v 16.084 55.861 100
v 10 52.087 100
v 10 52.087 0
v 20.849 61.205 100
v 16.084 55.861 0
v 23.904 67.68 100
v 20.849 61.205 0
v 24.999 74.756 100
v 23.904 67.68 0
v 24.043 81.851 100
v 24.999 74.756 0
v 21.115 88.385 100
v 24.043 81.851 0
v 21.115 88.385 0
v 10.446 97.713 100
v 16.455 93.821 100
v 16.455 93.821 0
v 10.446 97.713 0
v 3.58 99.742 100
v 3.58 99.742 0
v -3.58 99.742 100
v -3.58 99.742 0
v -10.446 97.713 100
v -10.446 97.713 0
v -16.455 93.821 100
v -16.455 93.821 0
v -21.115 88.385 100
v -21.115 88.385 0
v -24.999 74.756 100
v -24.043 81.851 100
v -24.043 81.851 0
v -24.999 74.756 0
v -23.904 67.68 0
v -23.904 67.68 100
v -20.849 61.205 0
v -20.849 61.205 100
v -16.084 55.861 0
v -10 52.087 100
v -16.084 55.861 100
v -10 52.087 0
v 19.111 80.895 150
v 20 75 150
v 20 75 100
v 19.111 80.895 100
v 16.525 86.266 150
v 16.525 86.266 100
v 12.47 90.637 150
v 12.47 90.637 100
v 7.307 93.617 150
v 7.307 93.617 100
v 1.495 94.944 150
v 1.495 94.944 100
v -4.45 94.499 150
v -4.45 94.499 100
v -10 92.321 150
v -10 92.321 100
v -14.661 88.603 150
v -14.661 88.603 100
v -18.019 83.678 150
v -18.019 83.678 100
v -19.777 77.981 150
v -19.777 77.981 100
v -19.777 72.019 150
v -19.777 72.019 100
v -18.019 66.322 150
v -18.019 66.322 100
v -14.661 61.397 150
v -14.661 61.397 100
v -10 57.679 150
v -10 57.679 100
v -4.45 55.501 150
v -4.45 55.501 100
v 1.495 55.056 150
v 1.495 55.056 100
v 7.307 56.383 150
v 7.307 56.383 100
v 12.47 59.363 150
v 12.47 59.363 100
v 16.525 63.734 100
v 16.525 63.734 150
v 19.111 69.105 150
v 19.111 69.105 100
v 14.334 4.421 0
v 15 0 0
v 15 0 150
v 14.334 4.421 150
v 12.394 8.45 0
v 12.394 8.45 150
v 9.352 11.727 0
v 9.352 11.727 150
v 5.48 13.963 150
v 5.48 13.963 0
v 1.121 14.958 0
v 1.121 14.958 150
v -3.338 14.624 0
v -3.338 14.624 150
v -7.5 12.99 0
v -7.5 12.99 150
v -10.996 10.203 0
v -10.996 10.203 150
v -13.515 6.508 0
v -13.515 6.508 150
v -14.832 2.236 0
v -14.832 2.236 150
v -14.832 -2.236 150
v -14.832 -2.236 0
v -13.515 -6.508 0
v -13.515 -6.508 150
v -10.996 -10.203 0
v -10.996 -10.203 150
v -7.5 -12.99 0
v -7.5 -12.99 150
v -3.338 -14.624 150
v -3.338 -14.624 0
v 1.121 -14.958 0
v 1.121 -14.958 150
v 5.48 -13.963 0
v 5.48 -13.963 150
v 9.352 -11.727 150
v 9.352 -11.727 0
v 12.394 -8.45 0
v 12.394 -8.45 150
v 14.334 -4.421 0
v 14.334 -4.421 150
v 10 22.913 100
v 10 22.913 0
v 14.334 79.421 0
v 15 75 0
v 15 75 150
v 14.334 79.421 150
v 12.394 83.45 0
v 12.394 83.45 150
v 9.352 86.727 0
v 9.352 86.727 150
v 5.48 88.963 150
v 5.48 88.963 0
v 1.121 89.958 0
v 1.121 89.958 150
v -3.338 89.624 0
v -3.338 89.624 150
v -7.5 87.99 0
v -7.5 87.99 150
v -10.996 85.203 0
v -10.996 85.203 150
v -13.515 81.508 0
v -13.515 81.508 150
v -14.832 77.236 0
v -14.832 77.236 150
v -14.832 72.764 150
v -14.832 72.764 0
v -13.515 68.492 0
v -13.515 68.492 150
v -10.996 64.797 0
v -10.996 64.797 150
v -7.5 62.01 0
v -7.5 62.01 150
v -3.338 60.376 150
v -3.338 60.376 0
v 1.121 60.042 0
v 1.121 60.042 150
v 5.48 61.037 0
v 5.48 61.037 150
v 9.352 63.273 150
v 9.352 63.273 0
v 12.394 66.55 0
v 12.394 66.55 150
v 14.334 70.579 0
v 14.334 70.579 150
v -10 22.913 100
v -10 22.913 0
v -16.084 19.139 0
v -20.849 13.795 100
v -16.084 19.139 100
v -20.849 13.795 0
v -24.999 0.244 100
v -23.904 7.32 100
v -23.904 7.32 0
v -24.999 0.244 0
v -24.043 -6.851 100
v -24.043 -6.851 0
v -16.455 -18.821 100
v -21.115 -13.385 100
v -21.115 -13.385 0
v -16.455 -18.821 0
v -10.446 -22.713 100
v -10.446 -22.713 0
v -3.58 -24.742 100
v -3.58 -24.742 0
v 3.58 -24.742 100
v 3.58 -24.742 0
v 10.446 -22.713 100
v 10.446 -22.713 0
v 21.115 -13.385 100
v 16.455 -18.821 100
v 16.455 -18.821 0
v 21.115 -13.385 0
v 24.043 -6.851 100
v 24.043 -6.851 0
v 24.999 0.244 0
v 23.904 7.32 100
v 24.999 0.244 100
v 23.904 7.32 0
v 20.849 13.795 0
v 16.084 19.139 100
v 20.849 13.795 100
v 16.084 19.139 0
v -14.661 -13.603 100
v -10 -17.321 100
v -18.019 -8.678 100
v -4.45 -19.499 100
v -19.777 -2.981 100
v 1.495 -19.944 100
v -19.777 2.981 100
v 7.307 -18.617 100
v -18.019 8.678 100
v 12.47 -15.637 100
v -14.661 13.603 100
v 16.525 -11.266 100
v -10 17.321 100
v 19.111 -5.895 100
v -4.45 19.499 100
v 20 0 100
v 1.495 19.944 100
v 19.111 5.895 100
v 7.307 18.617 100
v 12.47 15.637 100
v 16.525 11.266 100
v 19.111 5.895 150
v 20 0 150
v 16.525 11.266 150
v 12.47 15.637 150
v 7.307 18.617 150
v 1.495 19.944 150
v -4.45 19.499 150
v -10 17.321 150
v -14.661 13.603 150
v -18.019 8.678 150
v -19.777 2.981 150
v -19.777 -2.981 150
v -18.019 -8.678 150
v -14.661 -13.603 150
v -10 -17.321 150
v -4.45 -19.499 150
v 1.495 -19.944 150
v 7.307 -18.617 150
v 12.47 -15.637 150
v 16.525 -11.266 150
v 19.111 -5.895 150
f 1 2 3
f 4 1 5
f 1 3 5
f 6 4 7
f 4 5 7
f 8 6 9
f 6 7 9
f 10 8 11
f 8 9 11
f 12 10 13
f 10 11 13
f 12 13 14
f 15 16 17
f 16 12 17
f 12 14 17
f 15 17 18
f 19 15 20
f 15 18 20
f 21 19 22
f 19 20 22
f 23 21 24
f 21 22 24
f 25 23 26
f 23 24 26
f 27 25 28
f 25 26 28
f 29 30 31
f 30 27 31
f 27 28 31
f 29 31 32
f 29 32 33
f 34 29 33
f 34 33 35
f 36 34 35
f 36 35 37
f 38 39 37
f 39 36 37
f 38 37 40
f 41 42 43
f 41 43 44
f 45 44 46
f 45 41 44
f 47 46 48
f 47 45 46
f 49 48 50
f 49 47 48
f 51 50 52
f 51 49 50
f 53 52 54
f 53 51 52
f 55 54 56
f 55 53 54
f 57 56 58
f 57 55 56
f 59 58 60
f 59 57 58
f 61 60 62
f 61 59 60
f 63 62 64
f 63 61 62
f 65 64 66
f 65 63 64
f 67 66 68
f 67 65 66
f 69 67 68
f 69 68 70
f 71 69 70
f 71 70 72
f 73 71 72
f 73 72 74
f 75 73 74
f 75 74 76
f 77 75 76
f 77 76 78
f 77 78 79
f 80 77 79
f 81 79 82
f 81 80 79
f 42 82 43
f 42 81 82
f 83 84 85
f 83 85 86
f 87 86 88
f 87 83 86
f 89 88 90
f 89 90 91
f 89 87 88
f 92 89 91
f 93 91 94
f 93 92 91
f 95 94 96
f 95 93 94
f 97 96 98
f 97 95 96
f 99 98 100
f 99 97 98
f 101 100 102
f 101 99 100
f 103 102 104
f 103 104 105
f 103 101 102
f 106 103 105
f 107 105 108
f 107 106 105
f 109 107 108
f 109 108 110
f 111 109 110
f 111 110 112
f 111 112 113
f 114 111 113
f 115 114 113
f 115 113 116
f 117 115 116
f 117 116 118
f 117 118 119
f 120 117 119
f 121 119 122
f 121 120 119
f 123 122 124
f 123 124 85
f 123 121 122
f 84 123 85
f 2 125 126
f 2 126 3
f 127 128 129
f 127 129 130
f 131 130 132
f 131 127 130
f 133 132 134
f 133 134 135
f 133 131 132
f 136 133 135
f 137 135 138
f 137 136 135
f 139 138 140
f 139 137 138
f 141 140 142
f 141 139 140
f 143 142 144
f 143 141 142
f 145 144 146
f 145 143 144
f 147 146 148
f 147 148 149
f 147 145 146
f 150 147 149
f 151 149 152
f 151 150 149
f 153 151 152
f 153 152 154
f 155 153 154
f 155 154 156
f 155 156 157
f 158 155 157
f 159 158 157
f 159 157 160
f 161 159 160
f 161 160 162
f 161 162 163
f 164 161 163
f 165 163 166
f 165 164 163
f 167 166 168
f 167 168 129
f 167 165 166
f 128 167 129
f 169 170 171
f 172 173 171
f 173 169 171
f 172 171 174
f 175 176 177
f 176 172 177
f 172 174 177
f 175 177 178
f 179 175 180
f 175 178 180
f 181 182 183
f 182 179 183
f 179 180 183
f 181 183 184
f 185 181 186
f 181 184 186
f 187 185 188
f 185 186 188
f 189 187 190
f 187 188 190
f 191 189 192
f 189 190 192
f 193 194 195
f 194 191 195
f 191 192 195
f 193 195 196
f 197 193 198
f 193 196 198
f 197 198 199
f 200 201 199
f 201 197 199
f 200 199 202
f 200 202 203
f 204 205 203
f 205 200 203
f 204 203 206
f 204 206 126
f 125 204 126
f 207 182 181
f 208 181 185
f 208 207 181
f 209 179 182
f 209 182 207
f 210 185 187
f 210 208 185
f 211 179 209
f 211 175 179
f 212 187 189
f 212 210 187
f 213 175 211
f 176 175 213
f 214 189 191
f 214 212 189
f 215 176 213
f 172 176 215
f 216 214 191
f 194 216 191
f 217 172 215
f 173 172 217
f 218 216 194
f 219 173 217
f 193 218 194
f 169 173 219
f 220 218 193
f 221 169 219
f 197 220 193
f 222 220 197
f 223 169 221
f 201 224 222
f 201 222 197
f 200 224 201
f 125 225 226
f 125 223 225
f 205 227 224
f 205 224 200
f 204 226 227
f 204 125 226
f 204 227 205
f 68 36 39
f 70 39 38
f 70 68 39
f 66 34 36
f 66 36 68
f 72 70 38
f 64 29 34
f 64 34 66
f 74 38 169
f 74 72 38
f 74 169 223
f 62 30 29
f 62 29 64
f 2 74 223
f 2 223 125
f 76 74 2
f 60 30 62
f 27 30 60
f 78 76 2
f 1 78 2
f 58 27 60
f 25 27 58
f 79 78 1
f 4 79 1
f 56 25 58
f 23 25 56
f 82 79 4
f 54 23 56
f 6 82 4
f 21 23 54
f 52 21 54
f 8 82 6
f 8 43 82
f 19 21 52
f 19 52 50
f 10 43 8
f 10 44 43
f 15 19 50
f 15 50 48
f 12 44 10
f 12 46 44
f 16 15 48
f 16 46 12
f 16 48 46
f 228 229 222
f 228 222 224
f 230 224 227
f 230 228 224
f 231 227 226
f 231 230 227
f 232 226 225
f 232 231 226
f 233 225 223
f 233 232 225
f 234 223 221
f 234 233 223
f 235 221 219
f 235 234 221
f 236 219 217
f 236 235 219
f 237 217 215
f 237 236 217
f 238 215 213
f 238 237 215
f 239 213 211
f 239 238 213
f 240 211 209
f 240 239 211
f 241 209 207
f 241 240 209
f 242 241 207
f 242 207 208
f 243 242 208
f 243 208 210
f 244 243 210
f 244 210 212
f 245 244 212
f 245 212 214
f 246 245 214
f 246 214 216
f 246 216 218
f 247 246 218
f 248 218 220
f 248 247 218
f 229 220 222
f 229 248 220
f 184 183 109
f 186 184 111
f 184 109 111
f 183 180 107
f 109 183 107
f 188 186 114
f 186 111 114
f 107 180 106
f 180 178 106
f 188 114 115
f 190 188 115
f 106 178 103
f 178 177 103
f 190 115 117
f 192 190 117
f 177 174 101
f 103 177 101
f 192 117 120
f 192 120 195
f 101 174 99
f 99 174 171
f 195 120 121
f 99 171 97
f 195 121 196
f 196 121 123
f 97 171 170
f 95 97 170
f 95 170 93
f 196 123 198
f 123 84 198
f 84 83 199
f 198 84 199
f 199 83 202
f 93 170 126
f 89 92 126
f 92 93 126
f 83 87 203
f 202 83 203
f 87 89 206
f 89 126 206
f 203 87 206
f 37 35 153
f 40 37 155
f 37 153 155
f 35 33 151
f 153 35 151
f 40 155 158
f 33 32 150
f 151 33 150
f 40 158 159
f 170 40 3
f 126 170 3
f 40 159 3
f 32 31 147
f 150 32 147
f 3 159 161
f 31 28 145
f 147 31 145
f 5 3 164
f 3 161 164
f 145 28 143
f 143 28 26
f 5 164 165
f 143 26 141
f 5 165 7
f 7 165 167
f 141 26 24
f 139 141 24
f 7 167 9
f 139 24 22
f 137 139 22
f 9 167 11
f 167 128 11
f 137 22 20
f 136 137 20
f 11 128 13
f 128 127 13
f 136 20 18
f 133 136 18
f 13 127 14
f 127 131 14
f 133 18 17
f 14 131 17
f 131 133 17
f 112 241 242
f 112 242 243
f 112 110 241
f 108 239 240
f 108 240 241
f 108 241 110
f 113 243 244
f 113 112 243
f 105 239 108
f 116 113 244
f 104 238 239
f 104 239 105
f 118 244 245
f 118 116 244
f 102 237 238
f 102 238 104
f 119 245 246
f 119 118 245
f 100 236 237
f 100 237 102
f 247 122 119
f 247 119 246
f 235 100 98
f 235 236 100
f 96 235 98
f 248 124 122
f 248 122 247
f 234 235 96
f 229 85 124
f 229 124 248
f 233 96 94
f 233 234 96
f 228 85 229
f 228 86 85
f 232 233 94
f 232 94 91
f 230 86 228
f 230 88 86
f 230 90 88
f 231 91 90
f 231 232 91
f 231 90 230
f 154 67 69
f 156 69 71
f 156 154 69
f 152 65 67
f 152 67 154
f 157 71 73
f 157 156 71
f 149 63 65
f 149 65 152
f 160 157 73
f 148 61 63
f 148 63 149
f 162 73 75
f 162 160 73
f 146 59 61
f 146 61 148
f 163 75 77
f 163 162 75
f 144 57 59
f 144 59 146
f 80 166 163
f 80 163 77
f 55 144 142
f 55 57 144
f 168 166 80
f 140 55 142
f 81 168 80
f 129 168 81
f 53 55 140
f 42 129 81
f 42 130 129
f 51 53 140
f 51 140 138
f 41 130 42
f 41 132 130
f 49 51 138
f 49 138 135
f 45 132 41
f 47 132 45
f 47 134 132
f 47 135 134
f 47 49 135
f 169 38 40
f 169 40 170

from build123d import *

# Parameters (mm, degrees)
ESQUISSE1_R             = 15
BOSS_EXTRU_1_DEPTH      = 150
ESQUISSE3_OUTSIDE_W     = 92.312
ESQUISSE3_OUTSIDE_H     = 167.312
ESQUISSE3_OUTSIDE_R     = 20
ENL_V_MAT_EXTRU_2_DEPTH = 50


with BuildPart() as part:
    # Esquisse1 → Boss.-Extru.1 (new body)
    with BuildSketch(Plane.XY):
        with BuildLine():
            Line((-10, 52.087121525), (-10, 22.912878475))
            ThreePointArc((-10, 22.912878475), (0, -25), (10, 22.912878475))
            Line((10, 22.912878475), (10, 52.087121525))
            ThreePointArc((10, 52.087121525), (0, 100), (-10, 52.087121525))
        make_face()
        Circle(ESQUISSE1_R, mode=Mode.SUBTRACT)
        with Locations((0, 75)):
            Circle(ESQUISSE1_R, mode=Mode.SUBTRACT)
    extrude(amount=BOSS_EXTRU_1_DEPTH)

    # Esquisse3 outside → Enlèv. mat.-Extru.2 (cut)
    with BuildSketch(Plane.XY.offset(150)):
        with Locations((0, 37.5)):
            Rectangle(ESQUISSE3_OUTSIDE_W, ESQUISSE3_OUTSIDE_H)
        with Locations((0, 75)):
            Circle(ESQUISSE3_OUTSIDE_R, mode=Mode.SUBTRACT)
        Circle(ESQUISSE3_OUTSIDE_R, mode=Mode.SUBTRACT)
    extrude(amount=-ENL_V_MAT_EXTRU_2_DEPTH, mode=Mode.SUBTRACT)


solid = part.part
